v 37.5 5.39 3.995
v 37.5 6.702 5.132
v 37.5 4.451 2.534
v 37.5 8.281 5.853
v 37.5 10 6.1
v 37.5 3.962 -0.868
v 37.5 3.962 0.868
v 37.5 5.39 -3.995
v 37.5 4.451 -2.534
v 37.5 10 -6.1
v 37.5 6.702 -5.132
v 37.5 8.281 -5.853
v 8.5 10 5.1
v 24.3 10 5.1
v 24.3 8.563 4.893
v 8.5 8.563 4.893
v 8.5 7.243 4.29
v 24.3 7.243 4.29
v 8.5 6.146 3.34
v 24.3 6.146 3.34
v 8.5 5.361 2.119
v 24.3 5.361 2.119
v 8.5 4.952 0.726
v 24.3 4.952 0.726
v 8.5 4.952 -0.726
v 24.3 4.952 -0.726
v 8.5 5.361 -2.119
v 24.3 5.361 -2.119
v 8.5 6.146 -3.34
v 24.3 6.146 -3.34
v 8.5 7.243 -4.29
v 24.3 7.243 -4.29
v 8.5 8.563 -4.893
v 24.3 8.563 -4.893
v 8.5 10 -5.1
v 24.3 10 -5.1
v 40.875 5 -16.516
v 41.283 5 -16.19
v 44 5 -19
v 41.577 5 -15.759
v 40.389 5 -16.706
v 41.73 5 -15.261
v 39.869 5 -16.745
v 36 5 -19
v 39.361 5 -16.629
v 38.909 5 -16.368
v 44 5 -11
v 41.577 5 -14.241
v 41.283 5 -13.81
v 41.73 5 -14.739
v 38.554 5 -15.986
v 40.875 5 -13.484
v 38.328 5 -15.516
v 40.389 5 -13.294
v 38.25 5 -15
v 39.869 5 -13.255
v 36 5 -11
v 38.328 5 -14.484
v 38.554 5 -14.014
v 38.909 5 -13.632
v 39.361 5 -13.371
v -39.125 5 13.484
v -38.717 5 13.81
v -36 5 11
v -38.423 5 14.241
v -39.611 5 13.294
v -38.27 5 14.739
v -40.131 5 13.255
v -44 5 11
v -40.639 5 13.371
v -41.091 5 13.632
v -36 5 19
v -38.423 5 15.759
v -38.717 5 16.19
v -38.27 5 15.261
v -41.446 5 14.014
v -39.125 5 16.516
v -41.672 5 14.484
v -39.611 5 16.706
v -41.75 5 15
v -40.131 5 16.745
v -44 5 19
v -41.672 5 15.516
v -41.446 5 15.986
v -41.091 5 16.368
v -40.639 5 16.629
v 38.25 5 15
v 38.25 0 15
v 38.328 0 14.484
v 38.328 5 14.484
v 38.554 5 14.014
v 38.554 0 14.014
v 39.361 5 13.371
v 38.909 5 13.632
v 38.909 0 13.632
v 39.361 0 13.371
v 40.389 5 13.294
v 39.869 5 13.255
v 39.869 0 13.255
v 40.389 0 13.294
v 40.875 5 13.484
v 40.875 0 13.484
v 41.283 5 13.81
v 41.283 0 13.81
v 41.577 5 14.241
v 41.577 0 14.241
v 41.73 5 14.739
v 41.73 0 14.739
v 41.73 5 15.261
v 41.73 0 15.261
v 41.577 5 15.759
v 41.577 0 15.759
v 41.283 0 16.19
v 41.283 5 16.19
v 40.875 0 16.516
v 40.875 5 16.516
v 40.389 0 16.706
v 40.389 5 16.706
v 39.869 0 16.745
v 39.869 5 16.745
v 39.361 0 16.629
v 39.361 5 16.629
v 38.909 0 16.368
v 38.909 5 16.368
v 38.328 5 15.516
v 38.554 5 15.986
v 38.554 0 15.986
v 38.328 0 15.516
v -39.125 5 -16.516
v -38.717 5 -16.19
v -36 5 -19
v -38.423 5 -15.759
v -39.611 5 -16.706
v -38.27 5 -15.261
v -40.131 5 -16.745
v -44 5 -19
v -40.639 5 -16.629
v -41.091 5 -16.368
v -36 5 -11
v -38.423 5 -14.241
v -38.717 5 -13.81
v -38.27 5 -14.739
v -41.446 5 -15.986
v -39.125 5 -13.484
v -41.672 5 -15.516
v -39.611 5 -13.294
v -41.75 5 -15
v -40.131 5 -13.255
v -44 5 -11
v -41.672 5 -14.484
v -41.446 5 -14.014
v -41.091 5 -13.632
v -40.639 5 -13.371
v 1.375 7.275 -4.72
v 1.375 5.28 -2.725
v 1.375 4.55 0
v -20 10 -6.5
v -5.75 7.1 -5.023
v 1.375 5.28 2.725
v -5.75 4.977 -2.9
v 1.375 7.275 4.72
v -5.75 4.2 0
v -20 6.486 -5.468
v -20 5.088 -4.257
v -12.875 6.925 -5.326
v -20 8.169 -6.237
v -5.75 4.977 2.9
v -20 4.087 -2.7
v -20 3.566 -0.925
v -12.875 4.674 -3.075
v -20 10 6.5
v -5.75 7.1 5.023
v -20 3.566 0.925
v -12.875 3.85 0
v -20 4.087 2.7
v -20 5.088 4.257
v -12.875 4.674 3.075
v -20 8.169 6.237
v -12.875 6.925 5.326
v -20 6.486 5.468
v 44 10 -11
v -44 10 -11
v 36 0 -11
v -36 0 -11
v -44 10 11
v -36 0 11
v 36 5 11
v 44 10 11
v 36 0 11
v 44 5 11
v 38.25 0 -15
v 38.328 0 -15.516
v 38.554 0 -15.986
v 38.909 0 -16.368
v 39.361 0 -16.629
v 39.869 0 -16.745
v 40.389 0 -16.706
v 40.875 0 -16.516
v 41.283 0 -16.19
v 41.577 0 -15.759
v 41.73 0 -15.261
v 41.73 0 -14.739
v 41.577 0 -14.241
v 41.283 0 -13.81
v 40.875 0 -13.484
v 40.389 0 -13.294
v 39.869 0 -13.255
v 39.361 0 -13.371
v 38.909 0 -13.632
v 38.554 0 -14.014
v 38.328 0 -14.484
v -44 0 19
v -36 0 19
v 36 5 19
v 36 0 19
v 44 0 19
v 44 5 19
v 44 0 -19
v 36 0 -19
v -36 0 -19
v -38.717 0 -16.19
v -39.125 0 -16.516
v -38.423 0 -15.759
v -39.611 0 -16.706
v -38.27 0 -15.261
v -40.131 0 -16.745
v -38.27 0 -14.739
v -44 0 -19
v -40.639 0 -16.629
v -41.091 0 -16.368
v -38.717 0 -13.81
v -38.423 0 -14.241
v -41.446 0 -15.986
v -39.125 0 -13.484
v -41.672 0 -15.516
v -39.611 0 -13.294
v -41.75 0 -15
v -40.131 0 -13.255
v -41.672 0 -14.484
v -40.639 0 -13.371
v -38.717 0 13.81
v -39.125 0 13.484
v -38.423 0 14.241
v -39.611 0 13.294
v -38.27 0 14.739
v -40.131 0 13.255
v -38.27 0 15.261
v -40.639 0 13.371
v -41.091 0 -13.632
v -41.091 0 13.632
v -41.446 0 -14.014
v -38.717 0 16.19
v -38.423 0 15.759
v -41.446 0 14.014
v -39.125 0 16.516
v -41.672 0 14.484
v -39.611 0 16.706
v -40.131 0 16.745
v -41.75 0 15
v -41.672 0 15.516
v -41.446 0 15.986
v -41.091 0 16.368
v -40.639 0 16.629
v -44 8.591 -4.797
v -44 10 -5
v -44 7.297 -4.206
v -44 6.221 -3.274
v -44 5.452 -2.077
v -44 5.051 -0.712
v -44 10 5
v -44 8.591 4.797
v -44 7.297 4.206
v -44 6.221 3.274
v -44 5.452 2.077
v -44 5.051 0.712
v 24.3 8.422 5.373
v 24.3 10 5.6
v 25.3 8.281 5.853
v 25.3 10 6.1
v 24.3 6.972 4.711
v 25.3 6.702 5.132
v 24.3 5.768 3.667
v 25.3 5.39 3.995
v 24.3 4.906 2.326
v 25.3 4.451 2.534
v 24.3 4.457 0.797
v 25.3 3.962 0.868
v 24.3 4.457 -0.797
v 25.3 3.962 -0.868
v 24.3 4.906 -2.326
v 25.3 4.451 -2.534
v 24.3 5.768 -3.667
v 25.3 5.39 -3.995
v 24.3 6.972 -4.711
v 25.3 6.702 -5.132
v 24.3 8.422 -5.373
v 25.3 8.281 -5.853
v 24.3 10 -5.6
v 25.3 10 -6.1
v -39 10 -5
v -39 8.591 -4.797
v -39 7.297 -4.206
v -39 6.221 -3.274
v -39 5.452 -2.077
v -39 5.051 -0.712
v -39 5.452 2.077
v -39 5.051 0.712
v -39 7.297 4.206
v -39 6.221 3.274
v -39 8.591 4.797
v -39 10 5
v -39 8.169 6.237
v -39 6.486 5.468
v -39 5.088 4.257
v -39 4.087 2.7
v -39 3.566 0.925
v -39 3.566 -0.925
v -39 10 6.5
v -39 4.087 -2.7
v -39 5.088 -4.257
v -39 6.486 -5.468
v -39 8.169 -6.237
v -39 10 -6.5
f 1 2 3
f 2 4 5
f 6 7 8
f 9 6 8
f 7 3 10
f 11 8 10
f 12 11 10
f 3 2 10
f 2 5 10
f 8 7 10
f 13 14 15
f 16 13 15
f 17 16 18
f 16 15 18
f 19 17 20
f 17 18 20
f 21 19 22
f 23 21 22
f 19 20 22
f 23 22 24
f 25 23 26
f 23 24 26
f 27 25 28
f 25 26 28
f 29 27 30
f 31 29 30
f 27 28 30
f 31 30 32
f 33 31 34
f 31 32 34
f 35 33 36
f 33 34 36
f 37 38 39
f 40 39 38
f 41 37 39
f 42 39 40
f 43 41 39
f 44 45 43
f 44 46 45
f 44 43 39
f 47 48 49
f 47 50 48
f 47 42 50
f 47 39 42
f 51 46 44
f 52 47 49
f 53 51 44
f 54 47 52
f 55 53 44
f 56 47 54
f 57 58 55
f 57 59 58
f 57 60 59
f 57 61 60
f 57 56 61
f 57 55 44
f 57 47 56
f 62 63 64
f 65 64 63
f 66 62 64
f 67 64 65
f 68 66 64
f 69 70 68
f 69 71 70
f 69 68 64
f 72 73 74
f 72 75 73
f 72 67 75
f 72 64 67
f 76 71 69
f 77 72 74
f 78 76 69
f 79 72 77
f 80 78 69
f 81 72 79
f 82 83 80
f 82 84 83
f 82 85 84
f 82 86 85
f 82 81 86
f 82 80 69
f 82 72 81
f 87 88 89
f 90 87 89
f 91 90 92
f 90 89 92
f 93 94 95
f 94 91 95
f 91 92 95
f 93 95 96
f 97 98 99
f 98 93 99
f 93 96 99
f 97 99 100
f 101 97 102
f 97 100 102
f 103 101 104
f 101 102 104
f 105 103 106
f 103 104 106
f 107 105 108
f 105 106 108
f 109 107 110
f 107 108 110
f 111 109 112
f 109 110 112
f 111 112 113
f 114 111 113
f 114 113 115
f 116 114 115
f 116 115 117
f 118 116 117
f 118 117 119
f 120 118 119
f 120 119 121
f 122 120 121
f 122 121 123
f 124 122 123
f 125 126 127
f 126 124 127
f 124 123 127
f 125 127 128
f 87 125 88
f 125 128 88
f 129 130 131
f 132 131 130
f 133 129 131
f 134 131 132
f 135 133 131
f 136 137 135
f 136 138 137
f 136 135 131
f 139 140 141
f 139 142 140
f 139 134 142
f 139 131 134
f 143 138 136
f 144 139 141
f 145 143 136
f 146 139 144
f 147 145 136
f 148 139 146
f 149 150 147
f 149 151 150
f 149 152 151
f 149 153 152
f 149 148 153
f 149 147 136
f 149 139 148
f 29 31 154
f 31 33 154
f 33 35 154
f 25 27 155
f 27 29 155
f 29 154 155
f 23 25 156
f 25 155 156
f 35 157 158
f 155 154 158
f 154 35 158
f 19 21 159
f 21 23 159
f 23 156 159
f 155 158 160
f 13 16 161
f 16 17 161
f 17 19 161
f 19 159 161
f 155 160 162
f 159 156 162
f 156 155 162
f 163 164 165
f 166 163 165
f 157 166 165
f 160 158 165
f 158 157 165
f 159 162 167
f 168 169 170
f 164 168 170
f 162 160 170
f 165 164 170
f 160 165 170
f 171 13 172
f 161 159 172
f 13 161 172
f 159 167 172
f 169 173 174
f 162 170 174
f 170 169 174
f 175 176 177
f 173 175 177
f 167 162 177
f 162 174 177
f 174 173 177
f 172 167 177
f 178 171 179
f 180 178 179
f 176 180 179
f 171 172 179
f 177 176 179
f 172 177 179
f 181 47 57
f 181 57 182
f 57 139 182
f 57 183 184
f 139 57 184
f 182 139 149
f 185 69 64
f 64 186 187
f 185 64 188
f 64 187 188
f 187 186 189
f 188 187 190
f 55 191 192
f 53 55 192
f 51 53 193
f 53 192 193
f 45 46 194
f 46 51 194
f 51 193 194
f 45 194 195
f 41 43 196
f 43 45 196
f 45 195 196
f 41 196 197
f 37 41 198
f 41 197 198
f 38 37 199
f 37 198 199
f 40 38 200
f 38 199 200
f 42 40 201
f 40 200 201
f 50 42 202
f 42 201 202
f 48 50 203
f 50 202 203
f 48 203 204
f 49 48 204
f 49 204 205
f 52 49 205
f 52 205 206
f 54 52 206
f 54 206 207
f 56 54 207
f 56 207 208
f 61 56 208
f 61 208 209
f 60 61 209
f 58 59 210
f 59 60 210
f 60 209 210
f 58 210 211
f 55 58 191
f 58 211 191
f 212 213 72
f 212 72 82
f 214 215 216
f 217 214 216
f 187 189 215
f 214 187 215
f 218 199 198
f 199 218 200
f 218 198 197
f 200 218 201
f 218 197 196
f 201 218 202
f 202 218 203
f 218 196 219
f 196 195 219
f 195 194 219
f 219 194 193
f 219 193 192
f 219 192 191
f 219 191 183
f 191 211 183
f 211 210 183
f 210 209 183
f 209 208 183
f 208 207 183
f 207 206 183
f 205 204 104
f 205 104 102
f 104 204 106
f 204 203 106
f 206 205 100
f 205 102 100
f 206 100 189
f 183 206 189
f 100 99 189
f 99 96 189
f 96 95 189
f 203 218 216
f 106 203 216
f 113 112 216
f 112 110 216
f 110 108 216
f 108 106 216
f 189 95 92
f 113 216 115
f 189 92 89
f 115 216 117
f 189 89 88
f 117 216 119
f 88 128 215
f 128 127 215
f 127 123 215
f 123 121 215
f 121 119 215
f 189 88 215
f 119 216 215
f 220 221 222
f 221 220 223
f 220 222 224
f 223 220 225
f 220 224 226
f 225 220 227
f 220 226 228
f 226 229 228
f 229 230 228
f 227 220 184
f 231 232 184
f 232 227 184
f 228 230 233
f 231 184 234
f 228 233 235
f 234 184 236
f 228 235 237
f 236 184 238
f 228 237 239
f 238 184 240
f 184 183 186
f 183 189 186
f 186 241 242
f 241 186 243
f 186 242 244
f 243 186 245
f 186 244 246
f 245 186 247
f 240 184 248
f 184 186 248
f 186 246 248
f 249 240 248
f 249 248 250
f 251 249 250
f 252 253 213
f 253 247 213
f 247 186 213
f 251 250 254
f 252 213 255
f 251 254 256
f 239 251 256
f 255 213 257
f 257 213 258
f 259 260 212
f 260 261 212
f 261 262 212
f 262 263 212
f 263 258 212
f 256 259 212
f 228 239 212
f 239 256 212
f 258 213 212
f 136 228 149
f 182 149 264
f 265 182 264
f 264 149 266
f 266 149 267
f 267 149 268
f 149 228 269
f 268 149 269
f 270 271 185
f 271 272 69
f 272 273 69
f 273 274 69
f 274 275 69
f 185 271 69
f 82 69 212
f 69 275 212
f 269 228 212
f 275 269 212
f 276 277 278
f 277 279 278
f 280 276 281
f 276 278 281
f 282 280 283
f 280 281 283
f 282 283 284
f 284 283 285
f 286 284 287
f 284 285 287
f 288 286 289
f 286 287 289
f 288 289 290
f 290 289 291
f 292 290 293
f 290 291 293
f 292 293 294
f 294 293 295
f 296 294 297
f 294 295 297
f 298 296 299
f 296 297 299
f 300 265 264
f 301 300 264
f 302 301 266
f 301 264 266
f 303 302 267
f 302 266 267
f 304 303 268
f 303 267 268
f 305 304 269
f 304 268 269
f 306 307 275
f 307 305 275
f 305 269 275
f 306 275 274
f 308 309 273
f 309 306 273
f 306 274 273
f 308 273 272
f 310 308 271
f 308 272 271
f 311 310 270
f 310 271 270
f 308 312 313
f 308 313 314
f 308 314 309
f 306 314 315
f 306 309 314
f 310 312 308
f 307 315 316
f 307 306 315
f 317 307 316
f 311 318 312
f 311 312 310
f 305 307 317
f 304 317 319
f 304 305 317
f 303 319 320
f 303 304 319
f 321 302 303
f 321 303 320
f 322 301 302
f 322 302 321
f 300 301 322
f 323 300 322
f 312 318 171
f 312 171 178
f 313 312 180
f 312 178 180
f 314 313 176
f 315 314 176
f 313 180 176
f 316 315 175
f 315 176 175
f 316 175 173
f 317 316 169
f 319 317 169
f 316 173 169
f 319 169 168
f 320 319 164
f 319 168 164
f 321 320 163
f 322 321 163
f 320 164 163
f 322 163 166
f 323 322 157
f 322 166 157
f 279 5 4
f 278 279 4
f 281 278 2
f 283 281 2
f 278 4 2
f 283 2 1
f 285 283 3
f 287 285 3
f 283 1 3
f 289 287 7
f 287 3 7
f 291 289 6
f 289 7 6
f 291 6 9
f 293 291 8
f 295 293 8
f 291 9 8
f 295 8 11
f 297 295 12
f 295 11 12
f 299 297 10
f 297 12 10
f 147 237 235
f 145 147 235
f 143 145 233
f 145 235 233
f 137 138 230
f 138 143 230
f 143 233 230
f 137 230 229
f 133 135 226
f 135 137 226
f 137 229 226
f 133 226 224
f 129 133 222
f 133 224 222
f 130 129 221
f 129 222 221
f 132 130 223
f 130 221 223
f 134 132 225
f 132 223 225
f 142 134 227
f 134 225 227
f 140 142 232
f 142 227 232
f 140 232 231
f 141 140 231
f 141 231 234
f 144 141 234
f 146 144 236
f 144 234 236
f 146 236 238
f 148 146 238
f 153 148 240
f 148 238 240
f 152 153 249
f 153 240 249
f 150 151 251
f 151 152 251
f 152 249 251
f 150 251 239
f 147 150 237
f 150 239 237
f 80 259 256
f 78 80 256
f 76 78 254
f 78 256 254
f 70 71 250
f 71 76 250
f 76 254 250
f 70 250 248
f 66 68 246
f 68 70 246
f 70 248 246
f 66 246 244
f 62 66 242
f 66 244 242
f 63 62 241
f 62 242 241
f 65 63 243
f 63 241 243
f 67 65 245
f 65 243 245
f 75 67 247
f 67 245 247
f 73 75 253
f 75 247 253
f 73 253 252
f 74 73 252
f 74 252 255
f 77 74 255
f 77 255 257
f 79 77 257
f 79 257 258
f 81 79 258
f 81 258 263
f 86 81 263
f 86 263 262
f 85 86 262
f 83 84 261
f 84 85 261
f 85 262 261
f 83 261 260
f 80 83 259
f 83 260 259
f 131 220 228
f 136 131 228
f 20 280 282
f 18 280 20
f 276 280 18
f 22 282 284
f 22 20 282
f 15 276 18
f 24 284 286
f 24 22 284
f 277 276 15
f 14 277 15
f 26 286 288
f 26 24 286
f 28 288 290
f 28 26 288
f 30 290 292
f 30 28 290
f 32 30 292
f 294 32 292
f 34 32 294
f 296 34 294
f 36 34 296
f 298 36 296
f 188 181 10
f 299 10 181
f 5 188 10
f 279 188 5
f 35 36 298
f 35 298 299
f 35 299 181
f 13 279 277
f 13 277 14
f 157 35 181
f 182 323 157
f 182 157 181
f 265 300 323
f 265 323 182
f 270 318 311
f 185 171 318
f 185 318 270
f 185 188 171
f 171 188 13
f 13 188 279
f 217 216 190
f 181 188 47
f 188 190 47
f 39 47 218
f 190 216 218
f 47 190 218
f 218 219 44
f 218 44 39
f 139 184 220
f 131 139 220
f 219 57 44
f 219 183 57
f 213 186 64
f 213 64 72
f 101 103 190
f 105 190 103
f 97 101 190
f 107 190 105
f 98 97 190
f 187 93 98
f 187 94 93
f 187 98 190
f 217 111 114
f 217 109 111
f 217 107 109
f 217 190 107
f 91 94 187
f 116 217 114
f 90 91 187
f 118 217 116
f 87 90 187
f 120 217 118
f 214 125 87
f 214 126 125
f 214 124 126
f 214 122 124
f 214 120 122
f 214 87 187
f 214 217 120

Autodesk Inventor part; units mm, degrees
ref_plane "YZ Plane" through (0, 0, 0) normal (1, 0, 0) x (0, 1, 0)
ref_plane "XZ Plane" through (0, 0, 0) normal (0, 1, 0) x (-1, 0, 0)
ref_plane "XY Plane" through (0, 0, 0) normal (0, 0, 1) x (1, 0, 0)
sketch "Sketch1" plane through (0, 0, 0) normal (0, 1, 0) x (-1, 0, 0)
  line L0 (44, 11) -> (-44, 11)
  line L1 (-44, 11) -> (-44, -11)
  line L2 (-44, -11) -> (44, -11)
  line L3 (44, -11) -> (44, 11)
  line L4 (44, 11) -> (-44, -11) construction
  line L5 (-44, 11) -> (44, -11) construction
  line L6 (36, 19) -> (44, 19)
  line L7 (44, 19) -> (44, 11)
  line L8 (44, 11) -> (36, 11)
  line L9 (36, 11) -> (36, 19)
  line L10 (36, 19) -> (44, 11) construction
  line L11 (44, 19) -> (36, 11) construction
  line L12 (36, -19) -> (44, -19)
  line L13 (44, -19) -> (44, -11)
  line L14 (44, -11) -> (36, -11)
  line L15 (36, -11) -> (36, -19)
  line L16 (36, -19) -> (44, -11) construction
  line L17 (44, -19) -> (36, -11) construction
  line L18 (-36, 19) -> (-44, 19)
  line L19 (-44, 19) -> (-44, 11)
  line L20 (-44, 11) -> (-36, 11)
  line L21 (-36, 11) -> (-36, 19)
  line L22 (-36, 19) -> (-44, 11) construction
  line L23 (-44, 19) -> (-36, 11) construction
  line L24 (-36, -19) -> (-44, -19)
  line L25 (-44, -19) -> (-44, -11)
  line L26 (-44, -11) -> (-36, -11)
  line L27 (-36, -11) -> (-36, -19)
  line L28 (-36, -19) -> (-44, -11) construction
  line L29 (-44, -19) -> (-36, -11) construction
  circle A0 centre (40, 15) radius 1.75
  circle A1 centre (40, -15) radius 1.75
  circle A2 centre (-40, 15) radius 1.75
  circle A3 centre (-40, -15) radius 1.75
  point P0 (0, 0)
  dimension "d0" = 22
  dimension "d1" = 88
  dimension "d2" = 8
  dimension "d3" = 8
  dimension "d8" = 3.5
  dimension "d9" = 3.5
  dimension "d10" = 3.5
  dimension "d11" = 3.5
  dimension "d24" = 30
  dimension "d25" = 80
extrude "Extrusion1" add sketch "Sketch1" along normal blind 10 contours L3 L2 L1 L0
extrude "Extrusion2" add sketch "Sketch1" along normal blind 5 contours L0 L9 L6 L7 | L13 L12 L15 L2 | L0 L19 L18 L21 | L27 L24 L25 L2
sketch "Sketch3" plane through (0, 10, 0) normal (0, 1, 0) x (1, 0, 0)
  line L0 (44, 11) -> (44, 19) projected
  line L1 (-44, -11) -> (44, -11)
  line L2 (44, -11) -> (44, 11)
  line L3 (44, 11) -> (-44, 11)
  line L4 (-44, 11) -> (-44, -11)
  line L5 (-44, -11) -> (44, 11) construction
  line L6 (44, -11) -> (-44, 11) construction
  line L7 (-36, -19) -> (-36, -11) projected
  line L8 (-44, -11) -> (-36, -11) projected
  line L9 (-44, -11) -> (-44, -19) projected
  line L10 (-44, -19) -> (-36, -19) projected
  circle A0 centre (-40, -15) radius 1.75 projected
  line L11 (-36, 11) -> (-44, 11) projected
  line L12 (-36, 11) -> (-36, 19) projected
  line L13 (-36, 19) -> (-44, 19) projected
  line L14 (-44, 19) -> (-44, 11) projected
  circle A1 centre (-40, 15) radius 1.75 projected
  line L15 (36, 19) -> (36, 11) projected
  line L16 (44, 11) -> (36, 11) projected
  line L17 (44, 11) -> (44, 19) projected
  line L18 (44, 19) -> (36, 19) projected
  circle A2 centre (40, 15) radius 1.75 projected
  line L19 (36, -11) -> (44, -11) projected
  line L20 (36, -11) -> (36, -19) projected
  line L21 (36, -19) -> (44, -19) projected
  line L22 (44, -19) -> (44, -11) projected
  circle A3 centre (40, -15) radius 1.75 projected
  point P0 (0, 0)
sketch "Sketch2" plane through (0, 10, 0) normal (0, 1, 0) x (1, 0, 0)
  line L0 (-98.02, 0) -> (97.5, 0)
  line L1 (-39, 5) -> (-39, 6.5)
  line L2 (-39, 6.5) -> (-20, 6.5)
  line L3 (-20, 6.5) -> (8.5, 5.1)
  line L4 (8.5, 5.1) -> (24.3, 5.1)
  line L5 (24.3, 5.1) -> (24.3, 5.6)
  line L6 (24.3, 5.6) -> (25.3, 6.1)
  line L7 (25.3, 6.1) -> (37.5, 6.1)
  line L8 (37.5, 6.1) -> (37.5, 0)
  line L9 (-38.5, 0) -> (37.5, 0)
  line L10 (-44, 11) -> (-44, -11) projected
  line L11 (-39, 5) -> (-44, 5)
  line L12 (-44, 5) -> (-44, 0)
  point P0 (0, 0)
  dimension "d12" = 13
  dimension "d13" = 12.2
  dimension "d14" = 1
  dimension "d15" = 0.5
  dimension "d16" = 10.2
  dimension "d17" = 76.5
  dimension "d18" = 13.2
  dimension "d19" = 19
  dimension "d20" = 5
  dimension "d21" = 29
  dimension "d23" = 10
revolve "Revolution1" cut sketch "Sketch2" angle 360 about axis through (-98.02, 10, 0) along (1, 0, 0)
equation "\"d9\" = d8"
equation "\"d10\" = d8"
equation "\"d11\" = d8"
properties part number "stick_antenna_case"
